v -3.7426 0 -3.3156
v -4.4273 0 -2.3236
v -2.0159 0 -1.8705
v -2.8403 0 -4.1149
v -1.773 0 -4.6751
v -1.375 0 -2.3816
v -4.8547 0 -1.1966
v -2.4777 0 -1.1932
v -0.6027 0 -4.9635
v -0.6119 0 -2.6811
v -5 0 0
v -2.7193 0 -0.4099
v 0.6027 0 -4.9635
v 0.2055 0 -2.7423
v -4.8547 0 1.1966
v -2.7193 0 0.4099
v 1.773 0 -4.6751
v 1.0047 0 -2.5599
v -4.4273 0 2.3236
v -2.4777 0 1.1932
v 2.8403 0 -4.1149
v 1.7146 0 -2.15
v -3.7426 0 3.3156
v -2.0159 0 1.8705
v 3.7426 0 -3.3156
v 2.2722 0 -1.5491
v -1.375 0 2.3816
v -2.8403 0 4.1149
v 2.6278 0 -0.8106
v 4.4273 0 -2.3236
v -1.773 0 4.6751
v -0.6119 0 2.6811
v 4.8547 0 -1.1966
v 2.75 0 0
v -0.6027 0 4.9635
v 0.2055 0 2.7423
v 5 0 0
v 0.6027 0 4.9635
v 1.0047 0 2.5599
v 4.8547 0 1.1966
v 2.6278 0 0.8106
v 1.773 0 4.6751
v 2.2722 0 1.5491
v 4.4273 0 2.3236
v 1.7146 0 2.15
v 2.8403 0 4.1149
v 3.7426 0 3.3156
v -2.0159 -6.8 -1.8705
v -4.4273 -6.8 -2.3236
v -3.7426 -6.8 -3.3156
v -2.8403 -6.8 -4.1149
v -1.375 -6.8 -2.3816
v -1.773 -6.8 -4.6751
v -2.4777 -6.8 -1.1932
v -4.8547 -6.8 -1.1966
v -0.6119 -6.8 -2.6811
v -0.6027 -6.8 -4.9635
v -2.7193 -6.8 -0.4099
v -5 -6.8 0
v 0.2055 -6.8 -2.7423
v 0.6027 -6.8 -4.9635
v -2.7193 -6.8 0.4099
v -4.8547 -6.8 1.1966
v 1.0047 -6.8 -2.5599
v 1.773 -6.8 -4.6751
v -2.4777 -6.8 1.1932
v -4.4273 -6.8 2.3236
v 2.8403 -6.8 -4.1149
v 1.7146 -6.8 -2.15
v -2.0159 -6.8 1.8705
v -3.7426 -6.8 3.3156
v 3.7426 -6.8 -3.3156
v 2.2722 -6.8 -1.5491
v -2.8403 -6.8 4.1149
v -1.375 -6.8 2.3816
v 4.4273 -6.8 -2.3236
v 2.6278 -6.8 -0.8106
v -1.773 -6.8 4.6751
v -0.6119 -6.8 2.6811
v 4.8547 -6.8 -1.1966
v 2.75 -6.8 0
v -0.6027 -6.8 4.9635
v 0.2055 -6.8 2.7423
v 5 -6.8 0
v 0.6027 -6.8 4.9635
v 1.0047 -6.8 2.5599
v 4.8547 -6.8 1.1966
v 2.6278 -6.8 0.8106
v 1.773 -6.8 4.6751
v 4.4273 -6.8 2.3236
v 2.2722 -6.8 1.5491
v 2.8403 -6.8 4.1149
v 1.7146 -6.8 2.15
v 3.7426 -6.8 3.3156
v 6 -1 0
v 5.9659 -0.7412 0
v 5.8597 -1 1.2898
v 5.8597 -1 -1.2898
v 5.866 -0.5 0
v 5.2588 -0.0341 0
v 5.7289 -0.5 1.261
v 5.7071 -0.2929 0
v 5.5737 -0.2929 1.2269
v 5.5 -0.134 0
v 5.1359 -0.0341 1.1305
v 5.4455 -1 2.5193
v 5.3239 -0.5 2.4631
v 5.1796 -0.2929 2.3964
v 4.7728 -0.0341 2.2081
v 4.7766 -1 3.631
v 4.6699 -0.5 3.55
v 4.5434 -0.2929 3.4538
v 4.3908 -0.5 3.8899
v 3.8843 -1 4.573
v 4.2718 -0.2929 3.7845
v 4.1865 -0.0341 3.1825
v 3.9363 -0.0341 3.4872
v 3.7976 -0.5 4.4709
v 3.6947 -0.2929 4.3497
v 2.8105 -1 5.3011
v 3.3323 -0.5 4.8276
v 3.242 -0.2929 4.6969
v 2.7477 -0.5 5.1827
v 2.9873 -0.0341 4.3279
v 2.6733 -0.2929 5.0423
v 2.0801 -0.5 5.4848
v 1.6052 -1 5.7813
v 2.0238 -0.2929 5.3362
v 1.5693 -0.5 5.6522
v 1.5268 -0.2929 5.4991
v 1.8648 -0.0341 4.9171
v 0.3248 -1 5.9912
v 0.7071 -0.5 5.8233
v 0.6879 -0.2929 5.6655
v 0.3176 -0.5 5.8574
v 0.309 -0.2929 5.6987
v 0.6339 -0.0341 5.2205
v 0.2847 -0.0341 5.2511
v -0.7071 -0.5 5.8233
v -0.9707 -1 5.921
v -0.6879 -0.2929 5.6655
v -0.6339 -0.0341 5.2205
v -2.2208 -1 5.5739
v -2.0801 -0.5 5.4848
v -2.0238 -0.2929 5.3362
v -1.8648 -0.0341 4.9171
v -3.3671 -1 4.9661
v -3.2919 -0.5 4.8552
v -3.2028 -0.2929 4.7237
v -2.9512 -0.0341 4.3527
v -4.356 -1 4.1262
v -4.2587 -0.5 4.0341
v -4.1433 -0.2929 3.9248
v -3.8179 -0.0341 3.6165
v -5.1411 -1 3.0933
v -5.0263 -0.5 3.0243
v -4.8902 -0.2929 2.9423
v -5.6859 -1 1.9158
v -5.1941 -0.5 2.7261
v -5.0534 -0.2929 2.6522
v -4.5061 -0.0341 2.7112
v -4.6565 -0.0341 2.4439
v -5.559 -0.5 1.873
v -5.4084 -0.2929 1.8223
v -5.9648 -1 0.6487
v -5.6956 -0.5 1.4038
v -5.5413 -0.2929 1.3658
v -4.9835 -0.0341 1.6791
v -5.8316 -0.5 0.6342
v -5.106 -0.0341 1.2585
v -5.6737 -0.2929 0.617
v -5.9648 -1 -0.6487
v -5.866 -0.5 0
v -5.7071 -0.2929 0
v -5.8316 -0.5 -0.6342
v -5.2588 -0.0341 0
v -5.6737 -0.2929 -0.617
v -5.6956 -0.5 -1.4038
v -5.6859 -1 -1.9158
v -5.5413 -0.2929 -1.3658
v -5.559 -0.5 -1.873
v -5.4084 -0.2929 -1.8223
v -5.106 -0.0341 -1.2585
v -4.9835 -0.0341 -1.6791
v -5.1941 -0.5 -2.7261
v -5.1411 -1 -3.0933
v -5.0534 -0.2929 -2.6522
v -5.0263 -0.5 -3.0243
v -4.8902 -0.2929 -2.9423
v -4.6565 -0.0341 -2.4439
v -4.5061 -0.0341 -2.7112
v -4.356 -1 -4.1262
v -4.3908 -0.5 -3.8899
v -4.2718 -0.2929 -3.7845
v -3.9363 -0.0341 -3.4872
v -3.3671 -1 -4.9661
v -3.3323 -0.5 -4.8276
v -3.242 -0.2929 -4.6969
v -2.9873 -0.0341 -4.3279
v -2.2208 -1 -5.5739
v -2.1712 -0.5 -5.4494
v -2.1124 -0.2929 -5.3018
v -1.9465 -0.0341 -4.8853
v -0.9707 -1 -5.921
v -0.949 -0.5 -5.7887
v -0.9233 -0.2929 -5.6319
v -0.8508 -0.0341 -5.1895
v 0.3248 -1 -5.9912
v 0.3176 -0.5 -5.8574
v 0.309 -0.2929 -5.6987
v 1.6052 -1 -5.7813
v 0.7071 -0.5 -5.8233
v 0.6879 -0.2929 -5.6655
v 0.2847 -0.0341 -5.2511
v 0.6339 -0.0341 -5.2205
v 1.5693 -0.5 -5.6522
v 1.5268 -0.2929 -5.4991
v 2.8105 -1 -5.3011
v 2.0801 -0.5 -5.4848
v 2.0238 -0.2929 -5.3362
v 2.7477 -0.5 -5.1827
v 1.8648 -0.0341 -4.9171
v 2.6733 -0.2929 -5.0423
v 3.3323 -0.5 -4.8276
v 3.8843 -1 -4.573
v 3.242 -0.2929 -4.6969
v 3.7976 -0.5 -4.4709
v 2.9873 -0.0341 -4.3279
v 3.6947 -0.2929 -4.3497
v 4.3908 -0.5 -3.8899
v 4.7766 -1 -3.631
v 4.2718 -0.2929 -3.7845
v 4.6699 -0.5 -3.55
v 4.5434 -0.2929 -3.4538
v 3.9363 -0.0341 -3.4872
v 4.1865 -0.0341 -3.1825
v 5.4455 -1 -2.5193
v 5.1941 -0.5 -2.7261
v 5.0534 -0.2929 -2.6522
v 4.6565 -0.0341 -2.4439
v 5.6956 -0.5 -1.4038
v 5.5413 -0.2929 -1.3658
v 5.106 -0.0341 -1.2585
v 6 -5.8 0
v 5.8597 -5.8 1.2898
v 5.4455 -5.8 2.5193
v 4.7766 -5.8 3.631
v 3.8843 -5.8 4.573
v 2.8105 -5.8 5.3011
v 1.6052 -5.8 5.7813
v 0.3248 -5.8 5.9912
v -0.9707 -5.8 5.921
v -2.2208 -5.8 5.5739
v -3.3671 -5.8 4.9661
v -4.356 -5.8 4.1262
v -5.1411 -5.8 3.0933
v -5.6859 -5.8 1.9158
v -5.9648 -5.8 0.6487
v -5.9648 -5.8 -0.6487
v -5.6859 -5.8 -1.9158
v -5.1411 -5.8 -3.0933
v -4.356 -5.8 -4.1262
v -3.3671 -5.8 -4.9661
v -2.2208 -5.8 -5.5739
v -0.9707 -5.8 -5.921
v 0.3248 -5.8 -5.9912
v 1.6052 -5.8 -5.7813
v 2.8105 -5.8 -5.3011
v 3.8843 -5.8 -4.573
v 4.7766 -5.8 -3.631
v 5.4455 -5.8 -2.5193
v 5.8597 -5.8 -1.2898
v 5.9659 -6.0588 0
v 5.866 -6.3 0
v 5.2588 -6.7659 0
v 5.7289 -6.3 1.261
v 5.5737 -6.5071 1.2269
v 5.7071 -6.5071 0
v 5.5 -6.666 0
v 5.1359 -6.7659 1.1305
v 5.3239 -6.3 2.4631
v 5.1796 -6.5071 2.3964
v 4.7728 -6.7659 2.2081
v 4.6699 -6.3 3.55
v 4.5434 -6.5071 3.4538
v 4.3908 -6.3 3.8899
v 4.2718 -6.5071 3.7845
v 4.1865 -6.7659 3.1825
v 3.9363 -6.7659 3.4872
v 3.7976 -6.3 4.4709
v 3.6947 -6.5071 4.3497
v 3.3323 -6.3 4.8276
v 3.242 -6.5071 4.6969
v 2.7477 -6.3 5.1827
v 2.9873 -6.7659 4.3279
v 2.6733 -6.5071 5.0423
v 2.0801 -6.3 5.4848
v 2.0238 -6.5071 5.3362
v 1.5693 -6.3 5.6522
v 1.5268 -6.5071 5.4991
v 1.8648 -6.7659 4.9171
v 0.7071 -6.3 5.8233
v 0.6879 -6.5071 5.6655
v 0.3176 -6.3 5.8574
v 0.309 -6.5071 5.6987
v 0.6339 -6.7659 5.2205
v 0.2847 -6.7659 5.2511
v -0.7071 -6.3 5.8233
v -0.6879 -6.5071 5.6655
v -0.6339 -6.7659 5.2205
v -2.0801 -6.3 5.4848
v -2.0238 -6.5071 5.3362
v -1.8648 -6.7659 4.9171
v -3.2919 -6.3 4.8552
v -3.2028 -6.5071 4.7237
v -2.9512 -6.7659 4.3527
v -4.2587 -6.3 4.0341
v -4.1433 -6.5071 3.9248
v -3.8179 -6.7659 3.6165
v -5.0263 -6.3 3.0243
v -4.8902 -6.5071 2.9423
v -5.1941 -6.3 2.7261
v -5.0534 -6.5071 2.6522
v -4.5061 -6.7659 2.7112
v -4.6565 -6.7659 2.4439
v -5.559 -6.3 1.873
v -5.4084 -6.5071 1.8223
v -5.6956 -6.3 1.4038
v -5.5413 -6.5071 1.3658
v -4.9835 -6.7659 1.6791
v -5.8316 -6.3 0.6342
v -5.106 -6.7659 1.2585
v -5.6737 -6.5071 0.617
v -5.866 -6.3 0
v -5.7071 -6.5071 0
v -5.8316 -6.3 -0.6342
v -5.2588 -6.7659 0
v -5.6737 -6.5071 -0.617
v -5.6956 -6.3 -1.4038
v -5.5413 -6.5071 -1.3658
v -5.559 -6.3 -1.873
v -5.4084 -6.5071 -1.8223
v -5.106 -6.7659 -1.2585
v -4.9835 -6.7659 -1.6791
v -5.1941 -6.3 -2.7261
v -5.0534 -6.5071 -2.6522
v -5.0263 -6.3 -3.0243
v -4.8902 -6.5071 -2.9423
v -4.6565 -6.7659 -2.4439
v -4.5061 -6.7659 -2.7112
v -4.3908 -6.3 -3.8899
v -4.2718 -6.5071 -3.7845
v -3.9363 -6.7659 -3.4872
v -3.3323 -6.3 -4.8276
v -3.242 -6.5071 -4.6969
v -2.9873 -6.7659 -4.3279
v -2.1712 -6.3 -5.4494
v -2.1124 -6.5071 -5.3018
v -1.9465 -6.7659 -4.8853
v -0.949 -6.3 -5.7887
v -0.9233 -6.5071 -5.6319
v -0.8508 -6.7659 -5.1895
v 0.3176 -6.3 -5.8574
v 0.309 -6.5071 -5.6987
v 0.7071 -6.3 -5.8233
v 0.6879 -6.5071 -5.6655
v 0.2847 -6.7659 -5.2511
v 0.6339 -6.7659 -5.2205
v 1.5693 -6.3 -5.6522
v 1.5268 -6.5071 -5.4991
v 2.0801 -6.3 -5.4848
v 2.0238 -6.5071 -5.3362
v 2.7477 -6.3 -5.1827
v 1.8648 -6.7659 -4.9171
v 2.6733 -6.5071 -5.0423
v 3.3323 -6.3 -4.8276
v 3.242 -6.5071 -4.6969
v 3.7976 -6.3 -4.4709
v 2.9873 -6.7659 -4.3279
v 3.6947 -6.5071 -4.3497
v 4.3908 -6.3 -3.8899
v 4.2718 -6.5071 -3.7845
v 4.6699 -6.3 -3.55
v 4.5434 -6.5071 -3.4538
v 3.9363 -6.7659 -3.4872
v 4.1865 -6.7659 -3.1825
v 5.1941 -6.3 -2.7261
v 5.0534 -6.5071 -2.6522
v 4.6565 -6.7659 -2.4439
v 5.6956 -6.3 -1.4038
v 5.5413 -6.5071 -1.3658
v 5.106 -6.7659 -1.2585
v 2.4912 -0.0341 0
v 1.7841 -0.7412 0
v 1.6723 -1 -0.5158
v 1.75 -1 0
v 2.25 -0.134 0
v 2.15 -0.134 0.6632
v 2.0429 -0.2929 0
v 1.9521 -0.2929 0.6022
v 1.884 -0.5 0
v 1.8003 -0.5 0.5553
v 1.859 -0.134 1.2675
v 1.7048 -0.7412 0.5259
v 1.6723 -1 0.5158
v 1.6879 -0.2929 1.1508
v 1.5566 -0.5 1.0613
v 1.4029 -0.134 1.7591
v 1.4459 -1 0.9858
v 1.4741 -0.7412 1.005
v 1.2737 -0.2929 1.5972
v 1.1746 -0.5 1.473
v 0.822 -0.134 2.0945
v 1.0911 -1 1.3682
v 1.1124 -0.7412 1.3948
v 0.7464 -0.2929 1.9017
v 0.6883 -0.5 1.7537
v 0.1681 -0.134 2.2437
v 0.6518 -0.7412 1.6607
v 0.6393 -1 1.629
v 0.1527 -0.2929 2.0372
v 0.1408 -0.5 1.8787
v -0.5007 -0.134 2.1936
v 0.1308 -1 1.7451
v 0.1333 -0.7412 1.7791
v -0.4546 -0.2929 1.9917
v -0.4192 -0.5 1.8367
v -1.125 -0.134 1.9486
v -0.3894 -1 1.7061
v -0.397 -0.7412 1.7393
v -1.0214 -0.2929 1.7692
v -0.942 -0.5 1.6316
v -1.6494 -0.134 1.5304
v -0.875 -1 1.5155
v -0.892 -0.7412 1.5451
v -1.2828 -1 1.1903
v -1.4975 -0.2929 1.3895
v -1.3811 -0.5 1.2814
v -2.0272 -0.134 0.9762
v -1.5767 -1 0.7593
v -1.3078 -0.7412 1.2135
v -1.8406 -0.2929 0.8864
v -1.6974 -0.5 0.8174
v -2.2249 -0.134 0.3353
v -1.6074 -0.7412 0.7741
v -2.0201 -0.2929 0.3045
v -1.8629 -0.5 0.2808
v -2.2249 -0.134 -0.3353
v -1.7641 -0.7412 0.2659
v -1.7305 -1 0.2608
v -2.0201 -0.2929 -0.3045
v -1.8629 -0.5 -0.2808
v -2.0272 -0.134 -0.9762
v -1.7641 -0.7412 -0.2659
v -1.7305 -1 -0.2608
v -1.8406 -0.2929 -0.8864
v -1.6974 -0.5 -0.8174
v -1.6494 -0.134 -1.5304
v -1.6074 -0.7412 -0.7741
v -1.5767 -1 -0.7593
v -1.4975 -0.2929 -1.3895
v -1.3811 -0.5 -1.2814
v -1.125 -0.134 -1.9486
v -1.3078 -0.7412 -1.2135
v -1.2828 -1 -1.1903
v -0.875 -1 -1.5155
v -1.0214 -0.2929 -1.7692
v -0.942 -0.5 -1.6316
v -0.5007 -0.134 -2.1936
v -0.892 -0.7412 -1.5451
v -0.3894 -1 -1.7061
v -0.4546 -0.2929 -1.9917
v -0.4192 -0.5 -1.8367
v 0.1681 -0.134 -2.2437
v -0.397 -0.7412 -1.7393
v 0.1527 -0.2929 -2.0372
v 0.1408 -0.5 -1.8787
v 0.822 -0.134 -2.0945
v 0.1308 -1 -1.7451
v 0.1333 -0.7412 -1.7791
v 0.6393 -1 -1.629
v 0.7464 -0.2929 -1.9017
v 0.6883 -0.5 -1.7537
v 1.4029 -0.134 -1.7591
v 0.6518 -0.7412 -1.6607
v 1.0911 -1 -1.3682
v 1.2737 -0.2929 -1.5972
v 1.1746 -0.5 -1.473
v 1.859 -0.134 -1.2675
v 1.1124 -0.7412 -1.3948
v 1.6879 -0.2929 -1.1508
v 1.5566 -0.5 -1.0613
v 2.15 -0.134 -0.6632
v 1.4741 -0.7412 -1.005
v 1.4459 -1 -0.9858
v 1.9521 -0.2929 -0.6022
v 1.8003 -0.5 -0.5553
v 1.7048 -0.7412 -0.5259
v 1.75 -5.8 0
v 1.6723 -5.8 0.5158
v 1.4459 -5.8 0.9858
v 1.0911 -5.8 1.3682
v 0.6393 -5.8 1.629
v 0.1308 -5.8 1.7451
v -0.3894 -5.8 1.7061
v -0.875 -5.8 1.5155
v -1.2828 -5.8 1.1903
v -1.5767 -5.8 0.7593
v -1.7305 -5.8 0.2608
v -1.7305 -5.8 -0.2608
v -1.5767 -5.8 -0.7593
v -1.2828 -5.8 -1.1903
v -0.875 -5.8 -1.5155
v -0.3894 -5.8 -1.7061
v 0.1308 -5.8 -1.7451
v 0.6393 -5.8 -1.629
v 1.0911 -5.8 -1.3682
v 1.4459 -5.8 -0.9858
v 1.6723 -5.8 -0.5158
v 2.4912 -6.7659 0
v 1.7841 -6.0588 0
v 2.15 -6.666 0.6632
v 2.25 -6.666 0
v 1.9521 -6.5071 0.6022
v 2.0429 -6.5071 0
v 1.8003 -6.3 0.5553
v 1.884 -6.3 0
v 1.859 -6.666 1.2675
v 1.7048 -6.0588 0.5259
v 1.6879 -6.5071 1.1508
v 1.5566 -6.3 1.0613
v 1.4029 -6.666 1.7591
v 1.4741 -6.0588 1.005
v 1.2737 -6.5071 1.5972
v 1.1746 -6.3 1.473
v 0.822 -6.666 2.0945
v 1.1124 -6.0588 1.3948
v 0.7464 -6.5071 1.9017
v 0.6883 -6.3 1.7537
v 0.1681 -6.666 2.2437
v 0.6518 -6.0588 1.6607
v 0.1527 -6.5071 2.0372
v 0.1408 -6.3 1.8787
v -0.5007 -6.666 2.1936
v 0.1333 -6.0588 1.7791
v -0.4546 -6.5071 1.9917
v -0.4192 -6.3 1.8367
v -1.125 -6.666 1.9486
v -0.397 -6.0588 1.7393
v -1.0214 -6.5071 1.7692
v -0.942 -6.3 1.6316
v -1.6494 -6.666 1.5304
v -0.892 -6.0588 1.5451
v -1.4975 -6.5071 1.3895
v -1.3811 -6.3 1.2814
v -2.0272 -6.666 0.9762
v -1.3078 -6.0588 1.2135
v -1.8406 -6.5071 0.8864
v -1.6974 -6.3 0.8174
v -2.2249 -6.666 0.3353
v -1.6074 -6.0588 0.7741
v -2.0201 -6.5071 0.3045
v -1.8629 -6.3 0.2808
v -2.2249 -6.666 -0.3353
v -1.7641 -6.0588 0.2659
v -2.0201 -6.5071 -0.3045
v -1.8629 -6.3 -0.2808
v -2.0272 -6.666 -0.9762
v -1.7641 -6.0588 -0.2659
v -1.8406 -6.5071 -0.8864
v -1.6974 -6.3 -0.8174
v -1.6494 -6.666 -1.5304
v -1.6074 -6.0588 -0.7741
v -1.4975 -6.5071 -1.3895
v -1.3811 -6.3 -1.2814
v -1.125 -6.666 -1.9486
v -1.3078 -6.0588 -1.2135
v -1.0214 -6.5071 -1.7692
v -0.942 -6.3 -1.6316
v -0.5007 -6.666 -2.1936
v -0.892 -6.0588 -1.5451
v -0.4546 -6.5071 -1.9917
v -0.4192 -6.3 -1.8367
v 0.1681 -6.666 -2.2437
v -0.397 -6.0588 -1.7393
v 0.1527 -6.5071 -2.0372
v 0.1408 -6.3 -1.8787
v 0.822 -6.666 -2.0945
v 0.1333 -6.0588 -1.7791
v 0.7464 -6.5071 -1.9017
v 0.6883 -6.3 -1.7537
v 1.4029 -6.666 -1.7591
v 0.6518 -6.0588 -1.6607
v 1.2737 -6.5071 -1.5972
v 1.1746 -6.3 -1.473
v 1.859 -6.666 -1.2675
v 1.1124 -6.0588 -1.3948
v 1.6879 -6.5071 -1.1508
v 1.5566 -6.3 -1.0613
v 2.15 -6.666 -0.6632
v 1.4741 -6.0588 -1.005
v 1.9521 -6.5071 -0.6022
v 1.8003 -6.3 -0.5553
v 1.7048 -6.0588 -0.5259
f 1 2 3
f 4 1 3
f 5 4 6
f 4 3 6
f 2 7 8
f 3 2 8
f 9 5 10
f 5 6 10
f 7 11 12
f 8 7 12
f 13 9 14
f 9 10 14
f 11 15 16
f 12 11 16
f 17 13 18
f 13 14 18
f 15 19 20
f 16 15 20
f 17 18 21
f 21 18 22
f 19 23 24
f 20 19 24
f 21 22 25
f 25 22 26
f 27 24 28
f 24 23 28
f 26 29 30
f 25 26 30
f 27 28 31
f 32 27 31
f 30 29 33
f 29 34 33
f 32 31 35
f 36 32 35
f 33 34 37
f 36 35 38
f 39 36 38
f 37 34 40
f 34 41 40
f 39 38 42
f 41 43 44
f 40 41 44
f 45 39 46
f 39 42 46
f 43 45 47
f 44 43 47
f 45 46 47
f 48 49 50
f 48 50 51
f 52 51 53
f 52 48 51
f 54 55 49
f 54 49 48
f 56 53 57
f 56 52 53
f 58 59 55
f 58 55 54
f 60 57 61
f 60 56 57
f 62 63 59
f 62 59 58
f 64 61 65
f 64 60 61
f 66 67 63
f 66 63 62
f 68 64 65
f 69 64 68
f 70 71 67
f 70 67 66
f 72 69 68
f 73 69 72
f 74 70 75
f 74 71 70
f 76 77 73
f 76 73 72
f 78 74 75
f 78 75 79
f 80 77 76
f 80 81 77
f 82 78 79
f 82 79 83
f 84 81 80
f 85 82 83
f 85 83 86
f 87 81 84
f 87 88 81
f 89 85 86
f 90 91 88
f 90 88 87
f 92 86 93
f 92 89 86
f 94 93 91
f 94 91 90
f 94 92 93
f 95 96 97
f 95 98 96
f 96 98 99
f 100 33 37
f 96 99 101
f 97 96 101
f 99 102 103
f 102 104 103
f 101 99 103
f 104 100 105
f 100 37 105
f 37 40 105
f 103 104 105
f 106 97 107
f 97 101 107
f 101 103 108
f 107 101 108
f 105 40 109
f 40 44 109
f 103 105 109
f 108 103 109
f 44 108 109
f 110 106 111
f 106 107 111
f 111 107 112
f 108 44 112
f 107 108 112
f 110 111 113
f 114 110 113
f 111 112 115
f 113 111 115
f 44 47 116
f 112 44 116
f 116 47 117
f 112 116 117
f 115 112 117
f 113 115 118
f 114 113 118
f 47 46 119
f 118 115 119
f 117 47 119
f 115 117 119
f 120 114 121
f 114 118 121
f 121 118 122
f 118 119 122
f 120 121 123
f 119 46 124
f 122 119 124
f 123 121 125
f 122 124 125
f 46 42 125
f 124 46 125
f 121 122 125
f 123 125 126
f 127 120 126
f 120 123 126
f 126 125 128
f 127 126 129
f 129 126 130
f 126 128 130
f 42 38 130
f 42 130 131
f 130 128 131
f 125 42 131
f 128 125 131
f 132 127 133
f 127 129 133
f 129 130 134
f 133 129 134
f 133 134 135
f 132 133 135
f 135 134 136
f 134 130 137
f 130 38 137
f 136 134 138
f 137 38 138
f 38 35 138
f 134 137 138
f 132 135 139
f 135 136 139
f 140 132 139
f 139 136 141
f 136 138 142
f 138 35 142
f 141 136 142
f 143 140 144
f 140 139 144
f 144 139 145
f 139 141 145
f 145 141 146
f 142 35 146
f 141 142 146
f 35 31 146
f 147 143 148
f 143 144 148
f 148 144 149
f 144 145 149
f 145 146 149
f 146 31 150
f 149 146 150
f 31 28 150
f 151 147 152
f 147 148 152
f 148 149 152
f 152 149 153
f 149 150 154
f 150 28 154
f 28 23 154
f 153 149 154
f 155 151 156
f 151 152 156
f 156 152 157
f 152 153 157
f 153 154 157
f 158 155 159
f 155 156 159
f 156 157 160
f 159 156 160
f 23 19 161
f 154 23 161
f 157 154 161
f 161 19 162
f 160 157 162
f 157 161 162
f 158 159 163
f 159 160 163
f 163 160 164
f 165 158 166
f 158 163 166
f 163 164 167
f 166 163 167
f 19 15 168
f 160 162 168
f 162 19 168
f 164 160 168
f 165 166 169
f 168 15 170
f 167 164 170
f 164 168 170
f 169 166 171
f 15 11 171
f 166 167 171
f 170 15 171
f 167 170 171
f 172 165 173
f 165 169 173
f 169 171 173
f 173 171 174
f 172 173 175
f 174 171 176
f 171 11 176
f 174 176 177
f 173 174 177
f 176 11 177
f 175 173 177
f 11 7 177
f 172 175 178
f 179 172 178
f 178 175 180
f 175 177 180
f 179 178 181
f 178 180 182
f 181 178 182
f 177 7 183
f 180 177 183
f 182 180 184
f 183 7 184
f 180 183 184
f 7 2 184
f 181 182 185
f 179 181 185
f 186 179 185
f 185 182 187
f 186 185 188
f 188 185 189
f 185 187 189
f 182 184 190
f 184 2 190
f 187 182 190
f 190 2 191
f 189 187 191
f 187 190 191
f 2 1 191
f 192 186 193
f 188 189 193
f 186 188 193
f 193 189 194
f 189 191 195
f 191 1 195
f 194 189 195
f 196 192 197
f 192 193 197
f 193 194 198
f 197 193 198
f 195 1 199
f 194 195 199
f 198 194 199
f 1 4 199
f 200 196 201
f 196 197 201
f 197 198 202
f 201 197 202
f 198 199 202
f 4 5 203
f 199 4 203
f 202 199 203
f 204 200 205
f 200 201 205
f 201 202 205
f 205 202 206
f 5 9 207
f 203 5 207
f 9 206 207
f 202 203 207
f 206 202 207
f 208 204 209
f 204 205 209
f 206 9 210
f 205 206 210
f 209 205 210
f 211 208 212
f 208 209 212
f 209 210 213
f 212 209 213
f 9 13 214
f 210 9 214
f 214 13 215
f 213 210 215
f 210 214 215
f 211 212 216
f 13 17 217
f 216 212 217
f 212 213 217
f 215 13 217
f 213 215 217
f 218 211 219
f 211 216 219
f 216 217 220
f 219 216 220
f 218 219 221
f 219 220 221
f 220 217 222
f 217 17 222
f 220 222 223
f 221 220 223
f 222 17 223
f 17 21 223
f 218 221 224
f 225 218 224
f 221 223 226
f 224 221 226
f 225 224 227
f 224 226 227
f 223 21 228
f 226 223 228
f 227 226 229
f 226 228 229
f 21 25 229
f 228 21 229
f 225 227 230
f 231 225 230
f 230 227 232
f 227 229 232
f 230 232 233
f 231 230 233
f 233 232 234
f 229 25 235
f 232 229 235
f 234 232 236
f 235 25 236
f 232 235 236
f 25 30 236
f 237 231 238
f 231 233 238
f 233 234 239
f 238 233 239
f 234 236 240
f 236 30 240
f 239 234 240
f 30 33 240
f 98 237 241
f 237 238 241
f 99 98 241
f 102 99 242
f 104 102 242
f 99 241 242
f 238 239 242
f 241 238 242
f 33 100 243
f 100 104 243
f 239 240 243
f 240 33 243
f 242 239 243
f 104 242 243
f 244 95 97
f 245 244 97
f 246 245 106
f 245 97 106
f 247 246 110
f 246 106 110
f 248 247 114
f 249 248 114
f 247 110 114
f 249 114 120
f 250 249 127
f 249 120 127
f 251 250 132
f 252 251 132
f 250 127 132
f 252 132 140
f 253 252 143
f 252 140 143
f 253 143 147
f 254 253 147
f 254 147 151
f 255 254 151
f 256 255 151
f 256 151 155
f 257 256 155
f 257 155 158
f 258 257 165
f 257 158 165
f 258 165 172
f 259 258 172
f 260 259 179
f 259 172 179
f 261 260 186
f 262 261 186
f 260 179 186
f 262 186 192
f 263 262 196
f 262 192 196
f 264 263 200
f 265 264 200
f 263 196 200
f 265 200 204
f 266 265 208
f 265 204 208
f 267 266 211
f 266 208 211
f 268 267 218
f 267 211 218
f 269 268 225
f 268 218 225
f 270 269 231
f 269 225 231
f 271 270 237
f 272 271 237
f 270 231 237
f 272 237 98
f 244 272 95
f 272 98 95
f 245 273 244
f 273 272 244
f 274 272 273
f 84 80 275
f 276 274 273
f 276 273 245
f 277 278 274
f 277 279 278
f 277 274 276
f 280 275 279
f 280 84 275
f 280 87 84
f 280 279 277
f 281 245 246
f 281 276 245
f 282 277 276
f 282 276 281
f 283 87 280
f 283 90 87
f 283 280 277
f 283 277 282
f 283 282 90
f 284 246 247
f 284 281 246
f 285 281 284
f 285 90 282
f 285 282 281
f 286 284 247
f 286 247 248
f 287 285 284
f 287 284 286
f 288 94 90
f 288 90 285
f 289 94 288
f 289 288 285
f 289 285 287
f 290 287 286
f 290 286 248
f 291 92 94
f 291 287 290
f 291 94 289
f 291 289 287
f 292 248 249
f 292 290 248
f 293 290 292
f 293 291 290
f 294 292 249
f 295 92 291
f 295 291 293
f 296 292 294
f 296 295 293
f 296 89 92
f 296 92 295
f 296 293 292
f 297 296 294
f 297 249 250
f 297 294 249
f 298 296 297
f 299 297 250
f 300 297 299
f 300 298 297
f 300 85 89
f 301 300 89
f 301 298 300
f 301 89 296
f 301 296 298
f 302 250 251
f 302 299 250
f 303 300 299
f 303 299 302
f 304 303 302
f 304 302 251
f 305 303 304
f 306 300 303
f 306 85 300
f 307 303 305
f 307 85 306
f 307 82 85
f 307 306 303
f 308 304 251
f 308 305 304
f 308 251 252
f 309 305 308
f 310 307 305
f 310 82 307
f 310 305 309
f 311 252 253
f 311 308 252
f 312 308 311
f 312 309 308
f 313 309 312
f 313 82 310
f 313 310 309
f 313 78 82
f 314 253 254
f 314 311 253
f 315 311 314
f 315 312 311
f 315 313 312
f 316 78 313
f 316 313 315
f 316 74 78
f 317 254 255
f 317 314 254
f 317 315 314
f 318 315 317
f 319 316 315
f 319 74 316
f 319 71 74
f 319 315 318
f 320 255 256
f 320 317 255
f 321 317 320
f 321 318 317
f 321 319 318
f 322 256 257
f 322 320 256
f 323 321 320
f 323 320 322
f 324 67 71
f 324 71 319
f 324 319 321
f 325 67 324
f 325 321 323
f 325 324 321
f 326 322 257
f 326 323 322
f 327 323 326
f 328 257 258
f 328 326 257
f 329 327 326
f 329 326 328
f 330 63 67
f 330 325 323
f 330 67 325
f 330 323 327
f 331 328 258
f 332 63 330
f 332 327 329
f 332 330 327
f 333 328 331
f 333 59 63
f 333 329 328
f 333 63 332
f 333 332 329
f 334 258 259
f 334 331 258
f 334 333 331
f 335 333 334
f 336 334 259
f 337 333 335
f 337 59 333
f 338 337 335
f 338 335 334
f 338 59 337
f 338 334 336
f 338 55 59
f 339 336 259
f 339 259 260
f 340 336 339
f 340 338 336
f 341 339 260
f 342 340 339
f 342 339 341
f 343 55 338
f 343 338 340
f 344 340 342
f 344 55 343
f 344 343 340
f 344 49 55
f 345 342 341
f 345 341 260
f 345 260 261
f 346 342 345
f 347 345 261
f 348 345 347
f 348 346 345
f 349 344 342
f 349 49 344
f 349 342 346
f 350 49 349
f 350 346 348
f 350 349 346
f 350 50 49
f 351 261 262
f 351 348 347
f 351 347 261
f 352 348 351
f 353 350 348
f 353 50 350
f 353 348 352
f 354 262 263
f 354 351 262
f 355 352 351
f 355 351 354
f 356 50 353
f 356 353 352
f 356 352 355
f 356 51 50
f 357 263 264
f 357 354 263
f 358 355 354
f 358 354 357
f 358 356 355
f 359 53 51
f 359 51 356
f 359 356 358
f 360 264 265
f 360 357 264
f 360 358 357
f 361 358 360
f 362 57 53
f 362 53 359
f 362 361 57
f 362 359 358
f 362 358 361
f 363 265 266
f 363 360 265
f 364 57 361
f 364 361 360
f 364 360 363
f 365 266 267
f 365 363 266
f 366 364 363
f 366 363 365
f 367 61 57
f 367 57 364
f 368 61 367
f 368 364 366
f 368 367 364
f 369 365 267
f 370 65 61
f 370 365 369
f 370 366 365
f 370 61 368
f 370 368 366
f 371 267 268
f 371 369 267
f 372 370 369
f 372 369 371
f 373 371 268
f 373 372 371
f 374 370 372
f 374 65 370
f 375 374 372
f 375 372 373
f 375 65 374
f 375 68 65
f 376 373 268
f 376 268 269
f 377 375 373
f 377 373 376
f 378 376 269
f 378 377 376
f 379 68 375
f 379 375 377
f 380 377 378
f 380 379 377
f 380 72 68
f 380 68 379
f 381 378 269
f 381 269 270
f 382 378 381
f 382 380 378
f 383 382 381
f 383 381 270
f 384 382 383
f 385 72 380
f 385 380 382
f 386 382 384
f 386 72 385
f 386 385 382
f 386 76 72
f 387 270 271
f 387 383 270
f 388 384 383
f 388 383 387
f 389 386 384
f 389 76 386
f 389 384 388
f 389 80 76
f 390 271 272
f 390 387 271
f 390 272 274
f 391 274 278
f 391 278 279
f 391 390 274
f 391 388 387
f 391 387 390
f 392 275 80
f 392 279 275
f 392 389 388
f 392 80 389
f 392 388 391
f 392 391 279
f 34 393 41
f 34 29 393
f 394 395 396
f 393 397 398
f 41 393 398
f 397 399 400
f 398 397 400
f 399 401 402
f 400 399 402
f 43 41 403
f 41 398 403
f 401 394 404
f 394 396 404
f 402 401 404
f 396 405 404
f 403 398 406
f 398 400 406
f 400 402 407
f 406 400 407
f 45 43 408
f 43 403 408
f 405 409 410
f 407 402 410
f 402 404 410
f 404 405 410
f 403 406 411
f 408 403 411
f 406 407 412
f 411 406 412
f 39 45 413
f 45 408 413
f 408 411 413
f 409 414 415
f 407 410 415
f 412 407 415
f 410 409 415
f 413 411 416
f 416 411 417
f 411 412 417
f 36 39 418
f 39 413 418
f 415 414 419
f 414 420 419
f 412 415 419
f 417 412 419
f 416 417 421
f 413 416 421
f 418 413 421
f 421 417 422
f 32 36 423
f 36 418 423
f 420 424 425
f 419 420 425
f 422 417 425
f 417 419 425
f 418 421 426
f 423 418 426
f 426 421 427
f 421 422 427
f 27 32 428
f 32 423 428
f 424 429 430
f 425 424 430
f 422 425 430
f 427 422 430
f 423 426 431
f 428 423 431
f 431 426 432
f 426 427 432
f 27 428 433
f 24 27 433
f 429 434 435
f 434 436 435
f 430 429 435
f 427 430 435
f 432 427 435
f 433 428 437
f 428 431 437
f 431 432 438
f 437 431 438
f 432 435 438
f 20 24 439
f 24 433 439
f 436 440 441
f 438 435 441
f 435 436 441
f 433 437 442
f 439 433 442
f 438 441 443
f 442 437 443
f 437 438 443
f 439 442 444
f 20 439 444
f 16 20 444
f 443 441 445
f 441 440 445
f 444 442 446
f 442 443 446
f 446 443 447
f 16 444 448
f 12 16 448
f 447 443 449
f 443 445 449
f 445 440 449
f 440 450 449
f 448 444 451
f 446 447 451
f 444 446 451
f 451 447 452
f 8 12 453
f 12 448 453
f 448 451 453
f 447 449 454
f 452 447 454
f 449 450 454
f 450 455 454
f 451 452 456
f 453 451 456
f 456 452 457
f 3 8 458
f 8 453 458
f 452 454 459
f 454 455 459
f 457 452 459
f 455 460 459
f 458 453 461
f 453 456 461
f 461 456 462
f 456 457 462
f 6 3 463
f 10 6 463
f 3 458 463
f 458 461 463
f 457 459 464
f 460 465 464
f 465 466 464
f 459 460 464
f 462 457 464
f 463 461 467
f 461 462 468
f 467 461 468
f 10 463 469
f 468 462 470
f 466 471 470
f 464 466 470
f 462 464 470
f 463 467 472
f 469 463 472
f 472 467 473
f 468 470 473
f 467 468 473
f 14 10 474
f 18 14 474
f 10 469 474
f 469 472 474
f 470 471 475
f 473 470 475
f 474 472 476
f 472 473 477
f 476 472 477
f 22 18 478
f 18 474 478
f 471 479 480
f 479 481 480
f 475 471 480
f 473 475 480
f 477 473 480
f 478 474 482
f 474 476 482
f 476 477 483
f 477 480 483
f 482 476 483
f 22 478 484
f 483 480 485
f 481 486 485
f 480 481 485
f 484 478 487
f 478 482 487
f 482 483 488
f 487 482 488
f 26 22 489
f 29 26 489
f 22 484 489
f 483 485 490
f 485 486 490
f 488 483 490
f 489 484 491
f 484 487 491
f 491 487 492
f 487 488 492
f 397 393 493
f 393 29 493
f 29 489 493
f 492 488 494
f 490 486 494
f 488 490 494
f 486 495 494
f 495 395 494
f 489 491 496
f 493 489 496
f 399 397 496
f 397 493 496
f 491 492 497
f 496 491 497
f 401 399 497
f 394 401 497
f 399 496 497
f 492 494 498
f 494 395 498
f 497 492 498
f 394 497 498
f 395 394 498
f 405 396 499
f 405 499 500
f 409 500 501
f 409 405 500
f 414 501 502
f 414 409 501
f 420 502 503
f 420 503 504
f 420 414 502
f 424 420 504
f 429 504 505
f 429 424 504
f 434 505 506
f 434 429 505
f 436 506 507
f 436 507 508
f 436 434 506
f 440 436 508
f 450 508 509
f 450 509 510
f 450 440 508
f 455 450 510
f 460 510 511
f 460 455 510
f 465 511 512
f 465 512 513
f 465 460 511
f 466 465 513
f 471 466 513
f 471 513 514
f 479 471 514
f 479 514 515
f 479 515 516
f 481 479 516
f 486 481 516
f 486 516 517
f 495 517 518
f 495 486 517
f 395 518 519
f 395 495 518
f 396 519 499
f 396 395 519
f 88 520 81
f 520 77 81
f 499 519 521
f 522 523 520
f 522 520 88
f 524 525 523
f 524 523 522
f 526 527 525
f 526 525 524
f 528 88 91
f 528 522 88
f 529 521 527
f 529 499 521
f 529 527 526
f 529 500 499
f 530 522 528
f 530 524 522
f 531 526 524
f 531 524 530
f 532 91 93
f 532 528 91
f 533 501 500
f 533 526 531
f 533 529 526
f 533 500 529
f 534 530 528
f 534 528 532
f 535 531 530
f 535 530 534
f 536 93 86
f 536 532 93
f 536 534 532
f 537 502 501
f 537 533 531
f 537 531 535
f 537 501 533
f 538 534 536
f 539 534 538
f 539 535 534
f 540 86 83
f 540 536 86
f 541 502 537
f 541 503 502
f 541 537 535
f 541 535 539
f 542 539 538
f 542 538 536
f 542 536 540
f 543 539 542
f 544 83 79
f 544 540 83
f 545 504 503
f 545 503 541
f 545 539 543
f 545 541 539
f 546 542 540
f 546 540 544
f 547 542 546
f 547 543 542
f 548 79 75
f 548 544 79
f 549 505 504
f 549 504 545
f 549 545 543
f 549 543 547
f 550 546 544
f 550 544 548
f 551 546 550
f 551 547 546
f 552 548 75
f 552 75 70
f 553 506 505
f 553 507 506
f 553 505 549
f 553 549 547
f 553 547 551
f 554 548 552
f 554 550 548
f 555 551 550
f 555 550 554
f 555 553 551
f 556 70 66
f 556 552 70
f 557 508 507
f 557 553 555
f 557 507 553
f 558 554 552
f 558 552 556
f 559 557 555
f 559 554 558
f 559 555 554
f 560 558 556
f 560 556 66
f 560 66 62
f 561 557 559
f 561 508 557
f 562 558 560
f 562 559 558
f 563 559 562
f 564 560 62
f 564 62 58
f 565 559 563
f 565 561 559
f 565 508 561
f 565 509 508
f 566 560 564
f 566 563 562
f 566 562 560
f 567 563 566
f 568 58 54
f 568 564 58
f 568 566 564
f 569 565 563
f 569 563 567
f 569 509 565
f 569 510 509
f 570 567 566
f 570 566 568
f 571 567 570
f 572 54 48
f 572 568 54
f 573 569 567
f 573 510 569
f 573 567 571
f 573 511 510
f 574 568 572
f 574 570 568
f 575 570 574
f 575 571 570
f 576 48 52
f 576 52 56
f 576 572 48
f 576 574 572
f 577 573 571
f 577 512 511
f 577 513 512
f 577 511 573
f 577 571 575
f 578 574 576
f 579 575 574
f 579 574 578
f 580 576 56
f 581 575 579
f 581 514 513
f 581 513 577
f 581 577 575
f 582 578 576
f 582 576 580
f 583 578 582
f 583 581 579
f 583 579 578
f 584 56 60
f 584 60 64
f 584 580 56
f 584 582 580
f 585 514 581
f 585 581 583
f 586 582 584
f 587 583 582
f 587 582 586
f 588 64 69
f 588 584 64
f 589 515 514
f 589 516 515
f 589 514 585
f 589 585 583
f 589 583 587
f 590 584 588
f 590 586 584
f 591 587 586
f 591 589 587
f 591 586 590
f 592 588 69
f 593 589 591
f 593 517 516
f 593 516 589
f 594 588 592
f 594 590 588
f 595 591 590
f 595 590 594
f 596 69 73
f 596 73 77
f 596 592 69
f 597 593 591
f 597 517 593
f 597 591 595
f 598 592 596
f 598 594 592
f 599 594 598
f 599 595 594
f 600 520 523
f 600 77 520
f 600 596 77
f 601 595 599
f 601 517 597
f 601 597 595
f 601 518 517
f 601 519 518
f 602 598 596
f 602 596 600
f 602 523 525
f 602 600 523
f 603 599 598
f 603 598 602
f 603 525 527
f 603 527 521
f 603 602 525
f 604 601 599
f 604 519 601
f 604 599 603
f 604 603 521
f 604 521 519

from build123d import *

# Parameters (mm, degrees)
F0_R     = 6
F0_R_2   = 1.75
F1_DEPTH = 6.8
F2_R     = 1
F3_R     = 1


with BuildPart() as f1:
    # F0 (on Front) → F1 (new body)
    with BuildSketch(Plane.XZ):
        Circle(F0_R)
        Circle(F0_R_2, mode=Mode.SUBTRACT)
    extrude(amount=F1_DEPTH)

    # F2
    f2_edges = [f1.edges().sort_by_distance(p)[0] for p in [
        (-6, -6.8, 0),
        (-6, 0, 0),
    ]]
    fillet(f2_edges, radius=F2_R)

    # F3
    f3_edges = [f1.edges().sort_by_distance(p)[0] for p in [
        (-1.75, -6.8, 0),
        (-1.75, 0, 0),
    ]]
    fillet(f3_edges, radius=F3_R)


solid = f1.part
